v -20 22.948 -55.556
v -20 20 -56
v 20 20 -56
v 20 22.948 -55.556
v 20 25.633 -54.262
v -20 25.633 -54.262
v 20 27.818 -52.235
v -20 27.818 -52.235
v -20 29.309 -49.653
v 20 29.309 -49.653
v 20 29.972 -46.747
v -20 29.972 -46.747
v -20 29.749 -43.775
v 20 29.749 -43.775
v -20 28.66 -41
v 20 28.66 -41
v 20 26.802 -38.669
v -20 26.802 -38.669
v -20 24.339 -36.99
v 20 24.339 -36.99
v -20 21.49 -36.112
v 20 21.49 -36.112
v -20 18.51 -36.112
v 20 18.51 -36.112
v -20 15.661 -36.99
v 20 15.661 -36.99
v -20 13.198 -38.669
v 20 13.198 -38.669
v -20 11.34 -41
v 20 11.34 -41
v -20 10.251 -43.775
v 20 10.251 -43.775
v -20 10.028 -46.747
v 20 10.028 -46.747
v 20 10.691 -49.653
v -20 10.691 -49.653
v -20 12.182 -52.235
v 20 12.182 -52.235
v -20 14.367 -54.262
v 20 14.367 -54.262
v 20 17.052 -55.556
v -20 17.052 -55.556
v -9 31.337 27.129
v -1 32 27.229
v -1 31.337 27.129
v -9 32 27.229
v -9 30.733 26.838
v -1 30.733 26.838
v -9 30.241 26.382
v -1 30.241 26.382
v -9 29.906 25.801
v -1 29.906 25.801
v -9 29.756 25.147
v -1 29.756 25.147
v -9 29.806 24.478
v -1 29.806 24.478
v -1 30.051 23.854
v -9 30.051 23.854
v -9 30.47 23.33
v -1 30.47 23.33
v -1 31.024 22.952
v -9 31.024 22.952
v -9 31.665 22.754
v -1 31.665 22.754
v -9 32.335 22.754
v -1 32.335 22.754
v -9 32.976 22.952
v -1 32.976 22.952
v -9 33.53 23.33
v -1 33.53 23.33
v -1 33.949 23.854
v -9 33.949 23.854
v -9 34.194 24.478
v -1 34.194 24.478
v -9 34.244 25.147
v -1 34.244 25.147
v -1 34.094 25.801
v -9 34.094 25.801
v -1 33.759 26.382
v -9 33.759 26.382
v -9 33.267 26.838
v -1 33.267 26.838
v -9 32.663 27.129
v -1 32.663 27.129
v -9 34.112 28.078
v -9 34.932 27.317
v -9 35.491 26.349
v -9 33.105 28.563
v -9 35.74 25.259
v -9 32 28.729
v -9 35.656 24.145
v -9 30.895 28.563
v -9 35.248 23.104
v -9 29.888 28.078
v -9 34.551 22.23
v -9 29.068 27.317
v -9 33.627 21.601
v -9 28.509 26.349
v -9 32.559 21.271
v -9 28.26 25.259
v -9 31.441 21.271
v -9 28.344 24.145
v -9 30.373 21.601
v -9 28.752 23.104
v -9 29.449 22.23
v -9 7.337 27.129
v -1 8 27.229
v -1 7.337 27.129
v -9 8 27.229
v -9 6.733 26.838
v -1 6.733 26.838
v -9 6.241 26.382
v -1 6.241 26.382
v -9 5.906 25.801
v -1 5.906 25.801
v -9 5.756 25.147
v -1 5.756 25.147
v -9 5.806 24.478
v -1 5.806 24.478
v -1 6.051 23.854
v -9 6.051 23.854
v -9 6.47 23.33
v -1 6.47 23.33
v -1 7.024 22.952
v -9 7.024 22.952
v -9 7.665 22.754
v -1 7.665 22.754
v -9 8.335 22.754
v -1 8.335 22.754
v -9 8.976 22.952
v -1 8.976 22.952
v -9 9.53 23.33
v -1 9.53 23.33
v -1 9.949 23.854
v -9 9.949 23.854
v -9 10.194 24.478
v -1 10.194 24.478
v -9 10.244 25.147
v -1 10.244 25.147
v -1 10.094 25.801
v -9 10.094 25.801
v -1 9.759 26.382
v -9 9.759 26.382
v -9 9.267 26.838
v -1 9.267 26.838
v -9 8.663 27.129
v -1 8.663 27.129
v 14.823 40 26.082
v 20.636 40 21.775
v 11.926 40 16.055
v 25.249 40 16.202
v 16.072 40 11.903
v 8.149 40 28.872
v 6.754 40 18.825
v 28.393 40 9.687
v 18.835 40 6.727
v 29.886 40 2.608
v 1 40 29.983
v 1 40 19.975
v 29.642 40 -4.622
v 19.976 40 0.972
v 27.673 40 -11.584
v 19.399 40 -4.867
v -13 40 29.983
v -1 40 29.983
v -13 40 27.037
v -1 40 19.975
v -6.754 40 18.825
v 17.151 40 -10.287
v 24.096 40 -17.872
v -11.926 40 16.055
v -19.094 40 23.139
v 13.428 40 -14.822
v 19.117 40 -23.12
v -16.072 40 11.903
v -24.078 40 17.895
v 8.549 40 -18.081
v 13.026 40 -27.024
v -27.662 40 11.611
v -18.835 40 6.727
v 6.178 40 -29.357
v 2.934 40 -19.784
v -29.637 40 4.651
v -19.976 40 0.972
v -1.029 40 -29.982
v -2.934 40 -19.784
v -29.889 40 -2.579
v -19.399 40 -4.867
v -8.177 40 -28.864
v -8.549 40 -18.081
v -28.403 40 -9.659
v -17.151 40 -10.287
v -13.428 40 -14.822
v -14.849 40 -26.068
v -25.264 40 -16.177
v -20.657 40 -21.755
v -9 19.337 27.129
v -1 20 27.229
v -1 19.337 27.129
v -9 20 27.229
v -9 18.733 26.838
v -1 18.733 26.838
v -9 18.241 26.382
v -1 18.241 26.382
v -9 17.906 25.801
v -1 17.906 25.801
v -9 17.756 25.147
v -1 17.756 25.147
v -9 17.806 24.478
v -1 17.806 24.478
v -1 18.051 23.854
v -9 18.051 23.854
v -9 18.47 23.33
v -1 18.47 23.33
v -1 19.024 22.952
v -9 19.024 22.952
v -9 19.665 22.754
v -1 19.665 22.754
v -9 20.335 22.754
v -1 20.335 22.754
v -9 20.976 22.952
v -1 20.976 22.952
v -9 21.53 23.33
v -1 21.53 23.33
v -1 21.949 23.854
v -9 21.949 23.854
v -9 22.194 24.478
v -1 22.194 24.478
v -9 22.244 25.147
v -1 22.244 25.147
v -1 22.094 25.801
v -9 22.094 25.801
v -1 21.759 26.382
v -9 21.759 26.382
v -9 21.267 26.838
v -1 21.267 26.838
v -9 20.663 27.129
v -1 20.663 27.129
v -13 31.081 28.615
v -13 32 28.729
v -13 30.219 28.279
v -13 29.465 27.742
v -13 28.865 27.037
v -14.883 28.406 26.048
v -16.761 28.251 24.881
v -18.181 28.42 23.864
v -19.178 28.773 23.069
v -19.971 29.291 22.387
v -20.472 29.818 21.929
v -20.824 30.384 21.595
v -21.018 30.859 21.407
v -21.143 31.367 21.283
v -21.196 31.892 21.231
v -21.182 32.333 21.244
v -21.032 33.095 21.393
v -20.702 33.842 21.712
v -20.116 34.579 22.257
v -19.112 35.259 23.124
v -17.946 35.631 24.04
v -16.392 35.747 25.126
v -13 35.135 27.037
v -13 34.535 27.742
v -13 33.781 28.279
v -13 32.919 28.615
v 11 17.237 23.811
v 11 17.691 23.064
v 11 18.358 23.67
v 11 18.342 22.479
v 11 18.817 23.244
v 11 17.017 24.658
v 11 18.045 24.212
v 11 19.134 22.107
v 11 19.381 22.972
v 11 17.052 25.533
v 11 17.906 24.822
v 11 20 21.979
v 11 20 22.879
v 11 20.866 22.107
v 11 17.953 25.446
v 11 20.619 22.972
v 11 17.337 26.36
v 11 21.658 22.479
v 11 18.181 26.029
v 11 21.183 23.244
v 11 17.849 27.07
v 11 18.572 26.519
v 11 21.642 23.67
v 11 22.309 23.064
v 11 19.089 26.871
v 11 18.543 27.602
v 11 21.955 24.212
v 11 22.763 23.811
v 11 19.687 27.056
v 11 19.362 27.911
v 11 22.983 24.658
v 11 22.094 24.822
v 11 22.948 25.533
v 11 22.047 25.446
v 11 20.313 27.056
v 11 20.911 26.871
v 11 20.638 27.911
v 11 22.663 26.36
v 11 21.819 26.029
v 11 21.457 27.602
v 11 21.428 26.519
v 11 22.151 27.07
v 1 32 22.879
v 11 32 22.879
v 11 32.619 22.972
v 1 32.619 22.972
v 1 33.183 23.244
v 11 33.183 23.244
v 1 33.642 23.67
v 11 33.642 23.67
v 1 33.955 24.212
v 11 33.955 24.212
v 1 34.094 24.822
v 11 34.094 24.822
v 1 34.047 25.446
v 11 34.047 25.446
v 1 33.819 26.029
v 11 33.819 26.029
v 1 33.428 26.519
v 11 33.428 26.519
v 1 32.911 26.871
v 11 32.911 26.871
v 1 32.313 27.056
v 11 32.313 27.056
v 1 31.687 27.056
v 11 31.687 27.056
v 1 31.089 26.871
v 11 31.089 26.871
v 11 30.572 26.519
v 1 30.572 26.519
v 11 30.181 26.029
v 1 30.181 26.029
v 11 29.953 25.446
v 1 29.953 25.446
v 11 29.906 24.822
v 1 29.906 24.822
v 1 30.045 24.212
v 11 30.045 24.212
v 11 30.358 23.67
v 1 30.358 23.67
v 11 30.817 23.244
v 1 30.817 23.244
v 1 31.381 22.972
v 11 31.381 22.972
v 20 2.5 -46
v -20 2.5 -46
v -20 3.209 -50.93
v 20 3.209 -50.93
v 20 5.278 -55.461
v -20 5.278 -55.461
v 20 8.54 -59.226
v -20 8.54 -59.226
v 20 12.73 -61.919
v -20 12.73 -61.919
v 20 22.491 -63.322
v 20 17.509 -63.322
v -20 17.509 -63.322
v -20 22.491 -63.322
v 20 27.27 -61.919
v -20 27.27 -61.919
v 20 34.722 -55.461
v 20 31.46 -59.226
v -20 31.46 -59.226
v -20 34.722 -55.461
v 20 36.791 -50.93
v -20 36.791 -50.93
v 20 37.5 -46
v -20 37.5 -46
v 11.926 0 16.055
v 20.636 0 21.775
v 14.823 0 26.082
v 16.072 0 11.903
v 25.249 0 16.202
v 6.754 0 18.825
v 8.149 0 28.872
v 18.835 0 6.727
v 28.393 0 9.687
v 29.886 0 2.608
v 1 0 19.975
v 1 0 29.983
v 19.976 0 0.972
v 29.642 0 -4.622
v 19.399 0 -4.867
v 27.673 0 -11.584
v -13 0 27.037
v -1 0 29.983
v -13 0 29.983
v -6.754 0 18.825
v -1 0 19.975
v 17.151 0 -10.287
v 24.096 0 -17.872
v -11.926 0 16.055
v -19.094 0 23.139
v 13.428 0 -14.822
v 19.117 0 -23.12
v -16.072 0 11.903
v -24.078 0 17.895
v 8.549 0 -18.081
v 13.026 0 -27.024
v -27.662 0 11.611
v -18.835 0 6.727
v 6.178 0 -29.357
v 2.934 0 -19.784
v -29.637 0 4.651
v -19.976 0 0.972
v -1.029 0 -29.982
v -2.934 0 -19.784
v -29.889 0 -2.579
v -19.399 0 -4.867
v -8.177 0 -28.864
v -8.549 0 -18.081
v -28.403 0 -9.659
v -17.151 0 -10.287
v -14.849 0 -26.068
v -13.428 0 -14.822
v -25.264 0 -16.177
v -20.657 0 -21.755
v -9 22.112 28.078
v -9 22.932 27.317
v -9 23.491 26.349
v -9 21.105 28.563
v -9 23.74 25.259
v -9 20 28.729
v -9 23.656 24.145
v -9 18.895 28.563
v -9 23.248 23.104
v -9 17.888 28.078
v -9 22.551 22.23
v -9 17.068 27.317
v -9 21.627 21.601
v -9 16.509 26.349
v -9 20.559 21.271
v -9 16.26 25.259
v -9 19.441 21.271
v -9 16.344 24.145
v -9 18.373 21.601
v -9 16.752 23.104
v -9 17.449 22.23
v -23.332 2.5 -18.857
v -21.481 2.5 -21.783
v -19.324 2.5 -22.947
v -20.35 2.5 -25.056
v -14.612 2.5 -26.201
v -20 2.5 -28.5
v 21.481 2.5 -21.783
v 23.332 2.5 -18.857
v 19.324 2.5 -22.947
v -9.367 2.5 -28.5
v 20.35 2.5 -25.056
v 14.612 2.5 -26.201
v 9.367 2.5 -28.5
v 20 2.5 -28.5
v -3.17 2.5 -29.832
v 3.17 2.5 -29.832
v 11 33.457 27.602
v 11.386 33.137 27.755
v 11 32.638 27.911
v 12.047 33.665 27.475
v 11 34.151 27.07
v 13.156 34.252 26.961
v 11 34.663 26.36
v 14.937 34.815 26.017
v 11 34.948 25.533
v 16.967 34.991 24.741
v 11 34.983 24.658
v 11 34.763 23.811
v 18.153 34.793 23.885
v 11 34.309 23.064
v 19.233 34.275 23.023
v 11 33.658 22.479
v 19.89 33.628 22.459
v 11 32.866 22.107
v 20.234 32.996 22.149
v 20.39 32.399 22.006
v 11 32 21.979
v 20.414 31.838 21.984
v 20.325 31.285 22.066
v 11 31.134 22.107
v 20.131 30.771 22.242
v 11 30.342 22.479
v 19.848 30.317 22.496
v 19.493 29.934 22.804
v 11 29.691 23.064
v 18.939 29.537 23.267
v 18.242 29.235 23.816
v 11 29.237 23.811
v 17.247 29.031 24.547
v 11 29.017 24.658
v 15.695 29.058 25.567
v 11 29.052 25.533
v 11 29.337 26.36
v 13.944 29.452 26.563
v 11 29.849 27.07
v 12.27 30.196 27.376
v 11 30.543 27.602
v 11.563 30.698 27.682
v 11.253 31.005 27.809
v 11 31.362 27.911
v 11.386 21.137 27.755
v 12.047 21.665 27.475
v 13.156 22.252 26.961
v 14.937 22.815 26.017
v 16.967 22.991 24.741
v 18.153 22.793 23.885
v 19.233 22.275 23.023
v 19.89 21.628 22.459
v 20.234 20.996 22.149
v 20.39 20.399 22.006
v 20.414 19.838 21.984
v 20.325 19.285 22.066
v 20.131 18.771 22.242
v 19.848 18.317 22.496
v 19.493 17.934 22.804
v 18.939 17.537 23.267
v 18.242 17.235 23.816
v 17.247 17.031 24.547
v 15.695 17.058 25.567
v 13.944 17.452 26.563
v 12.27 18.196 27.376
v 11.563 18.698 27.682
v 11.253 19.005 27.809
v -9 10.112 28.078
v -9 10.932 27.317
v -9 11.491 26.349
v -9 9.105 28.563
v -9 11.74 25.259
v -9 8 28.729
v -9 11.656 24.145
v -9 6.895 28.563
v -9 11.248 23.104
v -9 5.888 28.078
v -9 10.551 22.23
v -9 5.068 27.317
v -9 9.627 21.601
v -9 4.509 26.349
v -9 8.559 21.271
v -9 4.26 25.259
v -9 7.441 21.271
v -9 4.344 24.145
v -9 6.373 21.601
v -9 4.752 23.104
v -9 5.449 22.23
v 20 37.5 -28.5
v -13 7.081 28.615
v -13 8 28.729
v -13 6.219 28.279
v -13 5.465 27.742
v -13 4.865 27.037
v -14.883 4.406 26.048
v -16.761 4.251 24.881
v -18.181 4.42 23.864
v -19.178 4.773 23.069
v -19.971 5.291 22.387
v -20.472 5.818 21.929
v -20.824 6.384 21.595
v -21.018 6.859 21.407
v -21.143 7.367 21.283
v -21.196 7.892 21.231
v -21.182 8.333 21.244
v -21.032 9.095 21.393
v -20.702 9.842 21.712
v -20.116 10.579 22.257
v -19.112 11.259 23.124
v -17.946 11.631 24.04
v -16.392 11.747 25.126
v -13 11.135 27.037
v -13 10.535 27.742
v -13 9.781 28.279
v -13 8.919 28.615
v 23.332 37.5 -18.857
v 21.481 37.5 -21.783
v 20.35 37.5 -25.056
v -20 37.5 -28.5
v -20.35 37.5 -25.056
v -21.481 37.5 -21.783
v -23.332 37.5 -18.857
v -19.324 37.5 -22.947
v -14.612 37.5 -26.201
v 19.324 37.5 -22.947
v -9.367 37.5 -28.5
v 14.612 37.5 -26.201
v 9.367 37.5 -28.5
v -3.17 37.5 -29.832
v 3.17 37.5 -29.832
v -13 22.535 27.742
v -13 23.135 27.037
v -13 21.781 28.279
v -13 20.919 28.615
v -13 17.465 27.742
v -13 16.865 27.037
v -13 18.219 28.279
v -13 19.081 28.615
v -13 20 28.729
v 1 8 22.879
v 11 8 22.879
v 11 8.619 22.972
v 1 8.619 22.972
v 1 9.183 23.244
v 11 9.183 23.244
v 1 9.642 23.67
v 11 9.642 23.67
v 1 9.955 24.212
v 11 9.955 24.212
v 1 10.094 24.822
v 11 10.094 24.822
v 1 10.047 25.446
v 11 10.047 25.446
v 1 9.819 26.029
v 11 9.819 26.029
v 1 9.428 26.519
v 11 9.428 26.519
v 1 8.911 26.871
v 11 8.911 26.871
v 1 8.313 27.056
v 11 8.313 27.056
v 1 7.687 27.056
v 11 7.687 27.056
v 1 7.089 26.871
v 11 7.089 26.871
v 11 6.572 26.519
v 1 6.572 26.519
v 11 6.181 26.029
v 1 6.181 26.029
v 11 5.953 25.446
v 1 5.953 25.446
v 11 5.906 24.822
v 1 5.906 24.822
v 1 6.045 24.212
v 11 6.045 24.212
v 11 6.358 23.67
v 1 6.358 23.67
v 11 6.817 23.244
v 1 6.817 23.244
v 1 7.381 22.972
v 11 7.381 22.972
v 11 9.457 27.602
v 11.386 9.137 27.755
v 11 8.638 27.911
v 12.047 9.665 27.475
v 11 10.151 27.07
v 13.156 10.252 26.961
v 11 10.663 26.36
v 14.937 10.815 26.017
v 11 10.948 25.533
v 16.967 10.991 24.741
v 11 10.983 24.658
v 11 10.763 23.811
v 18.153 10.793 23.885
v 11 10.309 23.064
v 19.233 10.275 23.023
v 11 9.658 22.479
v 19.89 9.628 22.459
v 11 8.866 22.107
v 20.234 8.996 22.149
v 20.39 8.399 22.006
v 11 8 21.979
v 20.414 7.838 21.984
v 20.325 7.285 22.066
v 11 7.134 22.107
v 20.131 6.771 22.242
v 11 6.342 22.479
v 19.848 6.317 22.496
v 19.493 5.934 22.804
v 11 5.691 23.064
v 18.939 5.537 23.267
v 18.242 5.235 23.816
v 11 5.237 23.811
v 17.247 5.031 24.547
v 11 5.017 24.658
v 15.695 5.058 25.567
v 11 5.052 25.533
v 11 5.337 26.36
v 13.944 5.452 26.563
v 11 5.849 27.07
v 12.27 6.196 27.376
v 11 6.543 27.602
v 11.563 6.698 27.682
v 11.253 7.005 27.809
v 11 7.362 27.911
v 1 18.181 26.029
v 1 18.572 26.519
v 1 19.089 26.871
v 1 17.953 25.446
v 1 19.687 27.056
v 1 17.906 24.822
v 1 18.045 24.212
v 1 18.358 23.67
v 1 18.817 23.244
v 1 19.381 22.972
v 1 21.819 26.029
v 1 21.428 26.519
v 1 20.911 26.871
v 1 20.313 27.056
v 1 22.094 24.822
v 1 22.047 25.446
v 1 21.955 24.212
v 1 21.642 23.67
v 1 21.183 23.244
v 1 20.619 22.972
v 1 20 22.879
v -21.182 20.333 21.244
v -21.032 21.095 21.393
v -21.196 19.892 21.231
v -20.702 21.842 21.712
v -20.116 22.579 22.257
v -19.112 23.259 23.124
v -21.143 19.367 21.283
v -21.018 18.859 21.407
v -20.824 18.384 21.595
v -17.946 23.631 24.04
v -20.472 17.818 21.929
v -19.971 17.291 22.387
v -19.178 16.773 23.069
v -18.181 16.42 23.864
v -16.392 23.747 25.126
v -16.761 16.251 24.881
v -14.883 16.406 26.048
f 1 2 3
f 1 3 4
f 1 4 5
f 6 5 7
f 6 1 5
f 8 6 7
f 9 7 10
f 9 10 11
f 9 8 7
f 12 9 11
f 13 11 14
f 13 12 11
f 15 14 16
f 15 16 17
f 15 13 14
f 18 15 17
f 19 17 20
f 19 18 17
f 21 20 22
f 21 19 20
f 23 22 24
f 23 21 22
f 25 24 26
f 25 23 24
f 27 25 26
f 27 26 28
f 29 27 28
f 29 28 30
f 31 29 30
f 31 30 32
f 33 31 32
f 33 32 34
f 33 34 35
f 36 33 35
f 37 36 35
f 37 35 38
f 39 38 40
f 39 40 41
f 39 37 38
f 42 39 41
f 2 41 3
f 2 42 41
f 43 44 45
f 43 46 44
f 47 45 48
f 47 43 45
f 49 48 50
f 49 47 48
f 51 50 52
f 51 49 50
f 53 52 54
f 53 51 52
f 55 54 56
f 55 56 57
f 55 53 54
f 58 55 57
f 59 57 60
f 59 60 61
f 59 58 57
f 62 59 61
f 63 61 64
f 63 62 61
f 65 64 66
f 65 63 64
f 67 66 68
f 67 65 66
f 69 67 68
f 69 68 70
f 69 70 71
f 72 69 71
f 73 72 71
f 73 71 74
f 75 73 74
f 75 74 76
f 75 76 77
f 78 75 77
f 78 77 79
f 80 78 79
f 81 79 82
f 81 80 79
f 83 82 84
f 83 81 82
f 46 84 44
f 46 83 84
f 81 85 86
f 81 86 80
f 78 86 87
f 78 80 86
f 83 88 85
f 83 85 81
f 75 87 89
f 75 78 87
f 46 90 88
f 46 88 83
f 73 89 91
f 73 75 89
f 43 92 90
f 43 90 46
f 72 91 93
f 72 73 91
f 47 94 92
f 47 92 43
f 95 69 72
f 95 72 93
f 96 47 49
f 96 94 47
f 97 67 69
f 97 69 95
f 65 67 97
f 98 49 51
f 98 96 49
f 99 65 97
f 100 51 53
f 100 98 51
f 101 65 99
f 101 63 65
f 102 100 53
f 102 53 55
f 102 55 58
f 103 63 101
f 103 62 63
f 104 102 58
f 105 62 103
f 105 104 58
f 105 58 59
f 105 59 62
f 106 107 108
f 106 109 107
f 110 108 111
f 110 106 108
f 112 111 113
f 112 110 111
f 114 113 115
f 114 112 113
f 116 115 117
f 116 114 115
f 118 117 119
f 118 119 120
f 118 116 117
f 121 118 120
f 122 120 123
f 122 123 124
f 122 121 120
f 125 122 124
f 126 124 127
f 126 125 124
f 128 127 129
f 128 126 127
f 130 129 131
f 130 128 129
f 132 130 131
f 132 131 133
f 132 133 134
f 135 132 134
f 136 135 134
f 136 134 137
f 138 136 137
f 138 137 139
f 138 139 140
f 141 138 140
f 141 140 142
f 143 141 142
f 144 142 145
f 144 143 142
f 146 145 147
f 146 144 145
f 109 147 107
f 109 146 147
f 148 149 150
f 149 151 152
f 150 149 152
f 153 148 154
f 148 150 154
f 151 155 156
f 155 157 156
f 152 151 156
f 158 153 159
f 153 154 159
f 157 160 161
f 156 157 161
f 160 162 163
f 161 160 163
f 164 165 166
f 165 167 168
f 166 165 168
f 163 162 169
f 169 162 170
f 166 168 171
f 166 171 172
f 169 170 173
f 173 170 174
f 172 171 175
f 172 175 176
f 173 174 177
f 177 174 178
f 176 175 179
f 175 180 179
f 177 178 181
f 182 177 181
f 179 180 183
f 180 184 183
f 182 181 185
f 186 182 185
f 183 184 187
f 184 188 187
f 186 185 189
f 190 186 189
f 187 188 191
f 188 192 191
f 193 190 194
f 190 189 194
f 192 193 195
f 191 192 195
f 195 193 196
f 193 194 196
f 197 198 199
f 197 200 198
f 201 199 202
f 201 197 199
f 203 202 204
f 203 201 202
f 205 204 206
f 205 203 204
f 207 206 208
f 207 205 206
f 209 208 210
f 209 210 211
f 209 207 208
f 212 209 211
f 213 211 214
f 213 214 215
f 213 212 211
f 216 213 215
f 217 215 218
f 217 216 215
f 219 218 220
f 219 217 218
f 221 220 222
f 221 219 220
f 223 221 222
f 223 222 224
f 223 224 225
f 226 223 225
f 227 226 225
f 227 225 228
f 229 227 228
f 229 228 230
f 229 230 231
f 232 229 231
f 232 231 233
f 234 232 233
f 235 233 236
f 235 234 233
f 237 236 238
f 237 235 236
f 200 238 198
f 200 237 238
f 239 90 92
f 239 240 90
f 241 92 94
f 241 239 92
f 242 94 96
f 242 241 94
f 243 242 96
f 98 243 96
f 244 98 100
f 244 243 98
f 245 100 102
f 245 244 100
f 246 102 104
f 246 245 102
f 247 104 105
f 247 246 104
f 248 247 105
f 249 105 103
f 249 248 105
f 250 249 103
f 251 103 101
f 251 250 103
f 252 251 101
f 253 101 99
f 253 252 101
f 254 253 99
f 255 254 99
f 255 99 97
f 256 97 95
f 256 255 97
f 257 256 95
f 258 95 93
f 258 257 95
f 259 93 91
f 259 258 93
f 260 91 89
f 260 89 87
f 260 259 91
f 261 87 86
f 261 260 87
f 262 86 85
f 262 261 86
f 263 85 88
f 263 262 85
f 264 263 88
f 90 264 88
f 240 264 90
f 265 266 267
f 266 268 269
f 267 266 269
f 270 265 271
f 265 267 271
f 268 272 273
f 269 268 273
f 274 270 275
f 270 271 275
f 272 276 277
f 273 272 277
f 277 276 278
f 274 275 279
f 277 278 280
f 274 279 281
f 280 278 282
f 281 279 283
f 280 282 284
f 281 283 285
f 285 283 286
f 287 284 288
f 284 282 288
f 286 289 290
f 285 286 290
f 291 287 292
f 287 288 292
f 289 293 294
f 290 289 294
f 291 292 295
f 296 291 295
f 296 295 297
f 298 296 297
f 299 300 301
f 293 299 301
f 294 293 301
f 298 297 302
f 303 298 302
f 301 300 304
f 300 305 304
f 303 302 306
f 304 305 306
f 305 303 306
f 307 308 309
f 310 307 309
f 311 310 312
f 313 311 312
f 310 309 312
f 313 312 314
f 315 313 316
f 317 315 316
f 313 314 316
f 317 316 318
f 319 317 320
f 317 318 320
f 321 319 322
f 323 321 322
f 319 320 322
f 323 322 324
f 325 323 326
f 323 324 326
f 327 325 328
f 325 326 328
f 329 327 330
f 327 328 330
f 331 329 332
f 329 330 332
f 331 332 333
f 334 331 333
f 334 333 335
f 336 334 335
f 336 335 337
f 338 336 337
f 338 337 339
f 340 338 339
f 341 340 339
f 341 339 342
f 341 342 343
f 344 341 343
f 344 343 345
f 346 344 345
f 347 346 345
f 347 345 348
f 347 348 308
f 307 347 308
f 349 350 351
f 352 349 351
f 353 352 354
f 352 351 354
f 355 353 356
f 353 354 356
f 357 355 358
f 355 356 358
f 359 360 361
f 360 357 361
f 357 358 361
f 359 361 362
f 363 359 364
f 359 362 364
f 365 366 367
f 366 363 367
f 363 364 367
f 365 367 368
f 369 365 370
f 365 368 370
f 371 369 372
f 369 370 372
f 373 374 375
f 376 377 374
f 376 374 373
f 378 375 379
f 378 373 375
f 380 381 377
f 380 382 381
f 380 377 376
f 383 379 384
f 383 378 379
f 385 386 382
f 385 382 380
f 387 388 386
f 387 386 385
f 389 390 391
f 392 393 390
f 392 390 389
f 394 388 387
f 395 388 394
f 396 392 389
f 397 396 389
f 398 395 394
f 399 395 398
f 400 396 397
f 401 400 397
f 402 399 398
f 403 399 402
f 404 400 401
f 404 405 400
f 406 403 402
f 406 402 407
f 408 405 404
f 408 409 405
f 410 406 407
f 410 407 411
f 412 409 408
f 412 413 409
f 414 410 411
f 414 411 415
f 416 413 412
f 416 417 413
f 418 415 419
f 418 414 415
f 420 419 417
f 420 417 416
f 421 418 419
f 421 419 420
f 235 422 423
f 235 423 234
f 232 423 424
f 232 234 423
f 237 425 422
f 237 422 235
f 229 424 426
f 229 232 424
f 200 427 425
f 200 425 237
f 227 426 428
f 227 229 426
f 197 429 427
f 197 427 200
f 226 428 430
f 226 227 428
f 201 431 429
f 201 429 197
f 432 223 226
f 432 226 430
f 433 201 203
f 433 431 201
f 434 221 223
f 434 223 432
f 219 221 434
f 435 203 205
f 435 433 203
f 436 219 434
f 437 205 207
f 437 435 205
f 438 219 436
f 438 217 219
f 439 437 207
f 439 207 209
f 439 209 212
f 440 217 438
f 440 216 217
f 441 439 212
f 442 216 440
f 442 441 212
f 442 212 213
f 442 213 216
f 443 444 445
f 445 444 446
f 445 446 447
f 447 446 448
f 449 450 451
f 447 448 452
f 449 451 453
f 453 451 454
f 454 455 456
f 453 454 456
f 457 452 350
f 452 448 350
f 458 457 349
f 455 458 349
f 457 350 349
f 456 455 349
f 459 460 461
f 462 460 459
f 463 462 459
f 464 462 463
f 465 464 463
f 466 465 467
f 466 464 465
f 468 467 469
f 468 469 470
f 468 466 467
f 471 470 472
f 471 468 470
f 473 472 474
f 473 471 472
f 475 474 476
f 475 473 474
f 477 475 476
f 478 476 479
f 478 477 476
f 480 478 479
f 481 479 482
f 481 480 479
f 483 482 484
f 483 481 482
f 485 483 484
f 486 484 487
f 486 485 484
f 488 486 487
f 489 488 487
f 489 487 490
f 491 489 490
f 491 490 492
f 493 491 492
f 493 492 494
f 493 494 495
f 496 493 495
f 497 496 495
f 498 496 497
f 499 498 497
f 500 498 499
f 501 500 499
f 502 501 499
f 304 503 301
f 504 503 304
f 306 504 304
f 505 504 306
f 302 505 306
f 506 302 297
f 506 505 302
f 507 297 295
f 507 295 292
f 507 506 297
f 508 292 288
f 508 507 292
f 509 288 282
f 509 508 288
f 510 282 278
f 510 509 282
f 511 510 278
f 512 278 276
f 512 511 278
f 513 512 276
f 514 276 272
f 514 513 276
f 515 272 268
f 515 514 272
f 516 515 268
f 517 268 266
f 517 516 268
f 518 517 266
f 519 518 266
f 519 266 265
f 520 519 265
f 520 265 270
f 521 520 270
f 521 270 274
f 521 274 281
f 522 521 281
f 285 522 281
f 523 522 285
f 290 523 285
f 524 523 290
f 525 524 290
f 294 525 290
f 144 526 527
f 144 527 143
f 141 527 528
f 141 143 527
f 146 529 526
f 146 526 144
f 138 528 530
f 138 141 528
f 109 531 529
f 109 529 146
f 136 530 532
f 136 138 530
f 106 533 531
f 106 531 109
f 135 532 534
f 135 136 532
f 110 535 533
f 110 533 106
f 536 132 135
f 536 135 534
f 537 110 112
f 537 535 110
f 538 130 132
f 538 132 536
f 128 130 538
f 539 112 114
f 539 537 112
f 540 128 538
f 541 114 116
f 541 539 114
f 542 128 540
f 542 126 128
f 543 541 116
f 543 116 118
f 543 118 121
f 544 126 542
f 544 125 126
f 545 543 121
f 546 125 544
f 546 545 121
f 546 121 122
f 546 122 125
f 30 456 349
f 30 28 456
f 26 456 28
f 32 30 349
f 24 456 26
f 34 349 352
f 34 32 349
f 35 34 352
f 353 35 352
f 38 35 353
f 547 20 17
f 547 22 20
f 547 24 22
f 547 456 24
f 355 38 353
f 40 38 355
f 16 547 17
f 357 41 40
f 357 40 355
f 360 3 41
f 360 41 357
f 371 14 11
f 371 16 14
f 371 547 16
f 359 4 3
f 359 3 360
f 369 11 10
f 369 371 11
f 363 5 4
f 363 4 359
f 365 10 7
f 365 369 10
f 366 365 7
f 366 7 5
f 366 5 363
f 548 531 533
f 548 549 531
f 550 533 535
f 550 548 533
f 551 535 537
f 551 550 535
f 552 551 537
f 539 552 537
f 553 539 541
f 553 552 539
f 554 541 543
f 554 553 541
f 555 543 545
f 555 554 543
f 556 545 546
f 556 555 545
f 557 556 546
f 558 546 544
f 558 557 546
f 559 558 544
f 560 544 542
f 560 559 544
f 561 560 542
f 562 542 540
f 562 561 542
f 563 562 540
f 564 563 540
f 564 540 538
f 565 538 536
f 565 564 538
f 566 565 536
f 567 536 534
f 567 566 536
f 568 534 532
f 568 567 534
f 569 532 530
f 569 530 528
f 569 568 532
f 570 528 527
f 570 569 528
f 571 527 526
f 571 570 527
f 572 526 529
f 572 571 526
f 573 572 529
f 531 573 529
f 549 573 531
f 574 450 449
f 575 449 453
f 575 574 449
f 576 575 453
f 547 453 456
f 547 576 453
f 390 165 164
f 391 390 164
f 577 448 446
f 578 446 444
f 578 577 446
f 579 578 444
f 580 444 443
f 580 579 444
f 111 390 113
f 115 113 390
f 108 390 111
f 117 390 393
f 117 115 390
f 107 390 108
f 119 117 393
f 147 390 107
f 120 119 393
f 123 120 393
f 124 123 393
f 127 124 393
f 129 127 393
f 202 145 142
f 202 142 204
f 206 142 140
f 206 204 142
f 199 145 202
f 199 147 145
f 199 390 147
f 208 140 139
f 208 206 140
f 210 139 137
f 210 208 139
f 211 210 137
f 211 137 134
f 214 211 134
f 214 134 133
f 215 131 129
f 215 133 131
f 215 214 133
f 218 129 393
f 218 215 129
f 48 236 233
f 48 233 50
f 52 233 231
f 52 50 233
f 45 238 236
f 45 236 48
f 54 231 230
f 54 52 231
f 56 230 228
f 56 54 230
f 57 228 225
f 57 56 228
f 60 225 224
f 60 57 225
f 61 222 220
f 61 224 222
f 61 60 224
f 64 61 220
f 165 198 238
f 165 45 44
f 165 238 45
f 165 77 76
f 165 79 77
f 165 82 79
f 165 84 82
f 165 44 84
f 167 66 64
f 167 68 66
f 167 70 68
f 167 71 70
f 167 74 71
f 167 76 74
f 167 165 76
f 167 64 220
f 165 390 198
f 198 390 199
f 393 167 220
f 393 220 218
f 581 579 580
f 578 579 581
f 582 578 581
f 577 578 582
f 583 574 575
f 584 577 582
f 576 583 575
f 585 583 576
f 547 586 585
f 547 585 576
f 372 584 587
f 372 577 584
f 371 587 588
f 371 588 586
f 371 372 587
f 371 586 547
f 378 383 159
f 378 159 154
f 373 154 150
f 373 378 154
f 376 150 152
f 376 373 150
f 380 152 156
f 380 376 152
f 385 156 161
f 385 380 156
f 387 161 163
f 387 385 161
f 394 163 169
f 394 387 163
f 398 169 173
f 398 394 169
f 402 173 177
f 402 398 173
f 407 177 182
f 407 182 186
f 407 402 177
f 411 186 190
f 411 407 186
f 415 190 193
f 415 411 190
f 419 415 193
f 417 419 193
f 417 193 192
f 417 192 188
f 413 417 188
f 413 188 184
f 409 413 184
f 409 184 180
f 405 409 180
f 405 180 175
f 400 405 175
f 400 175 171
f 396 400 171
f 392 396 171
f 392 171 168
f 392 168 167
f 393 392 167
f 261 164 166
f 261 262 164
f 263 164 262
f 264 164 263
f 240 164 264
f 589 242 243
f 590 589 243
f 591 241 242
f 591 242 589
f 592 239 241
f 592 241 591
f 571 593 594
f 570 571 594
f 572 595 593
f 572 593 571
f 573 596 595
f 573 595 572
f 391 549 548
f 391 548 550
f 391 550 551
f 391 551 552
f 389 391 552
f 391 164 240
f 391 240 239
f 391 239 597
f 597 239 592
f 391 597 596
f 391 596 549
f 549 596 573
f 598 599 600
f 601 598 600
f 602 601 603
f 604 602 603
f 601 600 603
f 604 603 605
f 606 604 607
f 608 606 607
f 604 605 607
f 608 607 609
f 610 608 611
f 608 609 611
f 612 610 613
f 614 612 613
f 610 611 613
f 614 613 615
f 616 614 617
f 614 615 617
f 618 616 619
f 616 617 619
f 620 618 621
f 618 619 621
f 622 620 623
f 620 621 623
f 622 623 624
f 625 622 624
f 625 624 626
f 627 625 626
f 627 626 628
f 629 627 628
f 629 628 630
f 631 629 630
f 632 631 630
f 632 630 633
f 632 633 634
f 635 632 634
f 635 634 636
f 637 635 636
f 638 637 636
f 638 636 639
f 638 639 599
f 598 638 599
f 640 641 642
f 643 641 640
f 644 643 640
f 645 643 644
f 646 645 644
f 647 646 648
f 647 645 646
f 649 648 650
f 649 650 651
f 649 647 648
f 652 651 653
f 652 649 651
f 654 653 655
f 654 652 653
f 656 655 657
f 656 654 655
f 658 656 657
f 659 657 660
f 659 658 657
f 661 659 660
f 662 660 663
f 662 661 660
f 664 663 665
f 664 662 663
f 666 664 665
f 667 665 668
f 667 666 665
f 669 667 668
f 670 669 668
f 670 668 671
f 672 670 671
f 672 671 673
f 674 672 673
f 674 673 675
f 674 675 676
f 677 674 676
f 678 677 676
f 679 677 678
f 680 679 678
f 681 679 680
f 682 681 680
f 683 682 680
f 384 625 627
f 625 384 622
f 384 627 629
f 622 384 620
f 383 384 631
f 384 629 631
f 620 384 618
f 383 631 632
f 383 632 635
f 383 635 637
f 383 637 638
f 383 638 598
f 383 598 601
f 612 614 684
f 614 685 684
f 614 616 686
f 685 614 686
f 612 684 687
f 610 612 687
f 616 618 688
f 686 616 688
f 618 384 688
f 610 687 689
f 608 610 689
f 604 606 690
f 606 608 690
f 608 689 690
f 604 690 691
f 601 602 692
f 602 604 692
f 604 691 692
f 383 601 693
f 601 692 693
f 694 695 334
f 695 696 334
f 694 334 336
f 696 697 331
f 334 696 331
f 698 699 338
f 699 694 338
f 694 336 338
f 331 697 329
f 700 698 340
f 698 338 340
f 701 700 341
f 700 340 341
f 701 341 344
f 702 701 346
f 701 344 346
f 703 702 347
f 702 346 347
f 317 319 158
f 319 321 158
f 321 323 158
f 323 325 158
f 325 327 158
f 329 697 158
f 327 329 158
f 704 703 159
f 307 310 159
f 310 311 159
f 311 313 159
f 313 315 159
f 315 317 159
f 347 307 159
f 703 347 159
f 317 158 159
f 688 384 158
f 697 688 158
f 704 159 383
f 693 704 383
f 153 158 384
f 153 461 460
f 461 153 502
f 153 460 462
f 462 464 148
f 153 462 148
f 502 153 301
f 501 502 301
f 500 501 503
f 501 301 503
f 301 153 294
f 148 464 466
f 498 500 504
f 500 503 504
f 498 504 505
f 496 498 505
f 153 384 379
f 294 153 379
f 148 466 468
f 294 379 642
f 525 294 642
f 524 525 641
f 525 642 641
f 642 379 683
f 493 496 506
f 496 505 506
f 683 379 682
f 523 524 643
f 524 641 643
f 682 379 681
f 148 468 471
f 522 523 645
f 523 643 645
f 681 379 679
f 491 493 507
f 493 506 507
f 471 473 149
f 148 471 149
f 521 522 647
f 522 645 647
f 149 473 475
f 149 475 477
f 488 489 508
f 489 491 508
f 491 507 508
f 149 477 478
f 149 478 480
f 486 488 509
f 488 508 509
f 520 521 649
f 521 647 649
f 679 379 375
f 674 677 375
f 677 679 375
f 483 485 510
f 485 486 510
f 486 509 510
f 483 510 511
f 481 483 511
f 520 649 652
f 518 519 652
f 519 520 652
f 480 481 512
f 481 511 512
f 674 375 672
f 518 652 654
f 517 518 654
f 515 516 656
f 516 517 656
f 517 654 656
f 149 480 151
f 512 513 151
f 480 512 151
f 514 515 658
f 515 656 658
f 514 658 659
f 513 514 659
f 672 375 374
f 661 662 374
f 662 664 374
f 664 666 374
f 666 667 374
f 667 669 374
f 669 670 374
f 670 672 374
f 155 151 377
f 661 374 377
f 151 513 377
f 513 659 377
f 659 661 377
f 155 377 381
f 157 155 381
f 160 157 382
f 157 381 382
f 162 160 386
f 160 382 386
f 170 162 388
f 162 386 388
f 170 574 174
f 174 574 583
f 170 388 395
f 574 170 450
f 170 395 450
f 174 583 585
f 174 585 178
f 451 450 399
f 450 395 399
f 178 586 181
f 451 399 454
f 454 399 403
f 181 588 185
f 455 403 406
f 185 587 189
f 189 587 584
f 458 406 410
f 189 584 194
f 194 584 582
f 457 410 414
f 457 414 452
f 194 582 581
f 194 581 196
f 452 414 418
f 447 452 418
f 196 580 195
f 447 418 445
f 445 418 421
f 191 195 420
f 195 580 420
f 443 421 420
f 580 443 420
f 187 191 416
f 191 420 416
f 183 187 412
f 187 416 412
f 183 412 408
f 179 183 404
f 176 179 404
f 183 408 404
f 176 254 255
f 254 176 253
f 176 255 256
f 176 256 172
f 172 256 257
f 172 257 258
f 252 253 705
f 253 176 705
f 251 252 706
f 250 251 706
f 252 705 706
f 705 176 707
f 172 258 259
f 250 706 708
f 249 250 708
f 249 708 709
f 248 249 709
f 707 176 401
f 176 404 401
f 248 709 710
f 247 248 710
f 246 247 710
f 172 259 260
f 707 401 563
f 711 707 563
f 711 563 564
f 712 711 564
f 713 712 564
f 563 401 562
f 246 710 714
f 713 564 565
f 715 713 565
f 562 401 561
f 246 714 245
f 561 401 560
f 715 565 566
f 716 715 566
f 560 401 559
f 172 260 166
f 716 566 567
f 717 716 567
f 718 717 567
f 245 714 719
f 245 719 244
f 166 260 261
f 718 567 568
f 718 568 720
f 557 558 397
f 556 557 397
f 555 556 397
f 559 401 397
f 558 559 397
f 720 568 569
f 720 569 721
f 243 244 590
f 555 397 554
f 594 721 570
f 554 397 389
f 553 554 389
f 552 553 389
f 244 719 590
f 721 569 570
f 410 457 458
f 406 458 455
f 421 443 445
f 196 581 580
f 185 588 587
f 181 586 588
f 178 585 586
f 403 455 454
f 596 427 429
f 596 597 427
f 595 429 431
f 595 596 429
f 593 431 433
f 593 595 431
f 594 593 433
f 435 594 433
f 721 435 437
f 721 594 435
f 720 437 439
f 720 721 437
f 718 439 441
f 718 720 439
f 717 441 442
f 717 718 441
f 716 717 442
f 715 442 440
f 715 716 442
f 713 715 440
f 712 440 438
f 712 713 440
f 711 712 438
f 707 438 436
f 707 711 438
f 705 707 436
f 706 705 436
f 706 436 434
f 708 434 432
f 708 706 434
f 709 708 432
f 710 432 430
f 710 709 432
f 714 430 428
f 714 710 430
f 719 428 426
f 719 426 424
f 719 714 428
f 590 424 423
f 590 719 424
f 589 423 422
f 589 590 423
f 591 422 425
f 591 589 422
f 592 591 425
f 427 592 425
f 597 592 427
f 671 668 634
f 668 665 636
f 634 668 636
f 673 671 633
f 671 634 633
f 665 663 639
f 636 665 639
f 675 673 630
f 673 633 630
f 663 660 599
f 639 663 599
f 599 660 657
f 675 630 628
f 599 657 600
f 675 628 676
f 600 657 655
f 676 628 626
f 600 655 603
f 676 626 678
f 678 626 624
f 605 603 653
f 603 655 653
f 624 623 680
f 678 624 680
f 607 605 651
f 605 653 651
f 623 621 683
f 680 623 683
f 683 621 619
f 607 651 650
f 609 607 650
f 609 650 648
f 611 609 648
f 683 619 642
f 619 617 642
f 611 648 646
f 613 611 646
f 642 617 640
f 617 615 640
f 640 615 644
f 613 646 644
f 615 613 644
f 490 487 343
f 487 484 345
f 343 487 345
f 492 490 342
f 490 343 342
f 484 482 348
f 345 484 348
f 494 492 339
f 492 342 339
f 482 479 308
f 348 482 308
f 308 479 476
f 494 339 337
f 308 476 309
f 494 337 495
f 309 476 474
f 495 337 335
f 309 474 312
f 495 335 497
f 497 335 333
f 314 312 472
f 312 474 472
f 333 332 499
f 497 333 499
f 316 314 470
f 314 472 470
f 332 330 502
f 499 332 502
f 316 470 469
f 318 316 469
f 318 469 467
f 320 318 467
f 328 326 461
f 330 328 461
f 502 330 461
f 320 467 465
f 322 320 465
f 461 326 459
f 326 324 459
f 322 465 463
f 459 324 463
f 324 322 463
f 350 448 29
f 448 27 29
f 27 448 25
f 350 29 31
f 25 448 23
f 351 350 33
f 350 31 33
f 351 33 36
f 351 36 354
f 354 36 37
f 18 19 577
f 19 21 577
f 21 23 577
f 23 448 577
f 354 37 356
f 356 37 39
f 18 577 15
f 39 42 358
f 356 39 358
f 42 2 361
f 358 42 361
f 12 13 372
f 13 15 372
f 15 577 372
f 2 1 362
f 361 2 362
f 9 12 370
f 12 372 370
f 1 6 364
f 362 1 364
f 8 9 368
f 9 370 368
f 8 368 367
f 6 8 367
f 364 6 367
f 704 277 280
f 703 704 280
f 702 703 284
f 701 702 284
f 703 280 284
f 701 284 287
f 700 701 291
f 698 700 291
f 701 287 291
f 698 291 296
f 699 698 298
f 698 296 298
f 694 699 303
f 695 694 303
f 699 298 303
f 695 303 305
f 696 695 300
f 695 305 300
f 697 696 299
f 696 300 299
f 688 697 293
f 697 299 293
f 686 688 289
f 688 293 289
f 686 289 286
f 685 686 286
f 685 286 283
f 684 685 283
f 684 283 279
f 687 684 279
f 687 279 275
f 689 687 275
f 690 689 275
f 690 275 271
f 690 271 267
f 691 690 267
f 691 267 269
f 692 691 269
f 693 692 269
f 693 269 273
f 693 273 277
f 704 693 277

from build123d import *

# Parameters (mm, degrees)
SKETCH1_R                                    = 30
SKETCH1_R_2                                  = 20
BOSS_EXTRUDE1_DEPTH                          = 40
SKETCH2_W                                    = 2
SKETCH2_H                                    = 30
CUT_EXTRUDE1_DEPTH                           = 59.309518948
BOSS_EXTRUDE2_START                          = -40
BOSS_EXTRUDE2_DEPTH                          = 40
CBORE_FOR_M4_HEX_SOCKET_HEAD_CAP_SCR_2_COUNT = 2
CBORE_FOR_M4_HEX_SOCKET_HEAD_CAP_SCR_2_PITCH = 12
CBORE_FOR_M4_HEX_SOCKET_HEAD_CAP_SCR_3_COUNT = 2
CBORE_FOR_M4_HEX_SOCKET_HEAD_CAP_SCR_3_PITCH = 24
SKETCH6_R                                    = 3.75
CUT_EXTRUDE2_DEPTH                           = 66.946948375
F_5_4_5_4_DIAMETER_HOLE1_D                   = 4.2
SKETCH10_R                                   = 3
CUT_EXTRUDE3_DEPTH                           = 11
BOSS_EXTRUDE4_DEPTH                          = 20
BOSS_EXTRUDE4_DEPTH_BACK                     = 20
SKETCH13_R                                   = 17.5
SKETCH13_R_2                                 = 10
FILLET1_R                                    = 15


with BuildPart() as part:
    # Sketch1 → Boss-Extrude1 (new body)
    with BuildSketch(Plane(origin=(0, 0, 0), x_dir=(1, 0, 0), z_dir=(0, 1, 0))):
        with Locations(Location((0, 0, 0), (0, 0, 270))):
            Circle(SKETCH1_R)
        with Locations(Location((0, 0, 0), (0, 0, 270))):
            Circle(SKETCH1_R_2, mode=Mode.SUBTRACT)
    extrude(amount=BOSS_EXTRUDE1_DEPTH)

    # Sketch2 → Cut-Extrude1 (cut, through all)
    with BuildSketch(Plane(origin=(0, 40, 0), x_dir=(1, 0, 0), z_dir=(0, 1, 0))):
        with Locations((0, -15)):
            Rectangle(SKETCH2_W, SKETCH2_H)
    extrude(amount=-CUT_EXTRUDE1_DEPTH, mode=Mode.SUBTRACT)

    # Sketch3 → Boss-Extrude2 (add)
    with BuildSketch(Plane(origin=(0, 40, 0), x_dir=(1, 0, 0), z_dir=(0, 1, 0)).offset(BOSS_EXTRUDE2_START)):
        with BuildLine():
            Line((-1, -29.983328701), (-13, -29.983328701))
            Line((-13, -29.983328701), (-13, -27.037011669))
            ThreePointArc((-13, -27.037011669), (-7.153334608, -29.134683866), (-1, -29.983328701))
        make_face()
    extrude(amount=BOSS_EXTRUDE2_DEPTH)

    # Sketch5 → CBORE for M4 Hex Socket Head Cap Screw1 (revolve, cut)
    with BuildSketch(Plane(origin=(-13, 32, 24.979156528), x_dir=(0, 0, 1), z_dir=(0, 1, 0))):
        Polygon((0, 0), (0, 13.351936393), (2.25, 12), (2.25, 4), (3.75, 4), (3.75, 0), align=None)
    cbore_for_m4_hex_socket_head_cap_screw1 = revolve(axis=Axis((-19.35, 32, 24.979156528), (1, 0, 0)), mode=Mode.SUBTRACT)

    # CBORE for M4 Hex Socket Head Cap Scr 2: CBORE for M4 Hex Socket Head Cap Screw1 ×2
    with Locations(*[(0, -i * CBORE_FOR_M4_HEX_SOCKET_HEAD_CAP_SCR_2_PITCH, 0) for i in range(1, CBORE_FOR_M4_HEX_SOCKET_HEAD_CAP_SCR_2_COUNT)]):
        add(cbore_for_m4_hex_socket_head_cap_screw1, mode=Mode.SUBTRACT)

    # CBORE for M4 Hex Socket Head Cap Scr 3: CBORE for M4 Hex Socket Head Cap Screw1 ×2
    with Locations(*[(0, -i * CBORE_FOR_M4_HEX_SOCKET_HEAD_CAP_SCR_3_PITCH, 0) for i in range(1, CBORE_FOR_M4_HEX_SOCKET_HEAD_CAP_SCR_3_COUNT)]):
        add(cbore_for_m4_hex_socket_head_cap_screw1, mode=Mode.SUBTRACT)

    # Sketch6 → Cut-Extrude2 (cut, through all)
    with BuildSketch(Plane.ZY.offset(13)):
        with Locations((24.979156528, 32)):
            Circle(SKETCH6_R)
        with Locations((24.979156528, 20)):
            Circle(SKETCH6_R)
        with Locations((24.979156528, 8)):
            Circle(SKETCH6_R)
    extrude(amount=CUT_EXTRUDE2_DEPTH, mode=Mode.SUBTRACT)

    # Ø5.4 (5.4) Diameter Hole1 (through all)
    with Locations(Plane.ZY.offset(-1)):
        with Locations((24.979156528, 8), (24.979156528, 20), (24.979156528, 32)):
            Hole(F_5_4_5_4_DIAMETER_HOLE1_D / 2)

    # Sketch10 → Cut-Extrude3 (cut)
    with BuildSketch(Plane.ZY.offset(-22)):
        with Locations((24.979156528, 8)):
            Circle(SKETCH10_R)
        with Locations((24.979156528, 32)):
            Circle(SKETCH10_R)
        with Locations((24.979156528, 20)):
            Circle(SKETCH10_R)
    extrude(amount=CUT_EXTRUDE3_DEPTH, mode=Mode.SUBTRACT)

    # Sketch13 → Boss-Extrude4 (add, two sides: drawn at the far end of the back side and taken through both)
    # profile 1 of 3: a face of its own
    with BuildSketch(Plane(origin=(0, 0, 0), x_dir=(0, 0, -1), z_dir=(1, 0, 0)).offset(-BOSS_EXTRUDE4_DEPTH_BACK)):
        with BuildLine():
            ThreePointArc((28.5, 20), (33.625631329, 32.374368671), (46, 37.5))
            Line((46, 37.5), (30, 37.5))
            Line((30, 37.5), (28.5, 37.5))
            Line((28.5, 37.5), (28.5, 20))
        make_face()
    # profile 2 of 3: a face of its own
    with BuildSketch(Plane(origin=(0, 0, 0), x_dir=(0, 0, -1), z_dir=(1, 0, 0)).offset(-BOSS_EXTRUDE4_DEPTH_BACK)):
        with BuildLine():
            ThreePointArc((46, 2.5), (33.625631329, 7.625631329), (28.5, 20))
            Line((28.5, 20), (28.5, 2.5))
            Line((28.5, 2.5), (30, 2.5))
            Line((30, 2.5), (46, 2.5))
        make_face()
    # profile 3 of 3: a face of its own
    with BuildSketch(Plane(origin=(0, 0, 0), x_dir=(0, 0, -1), z_dir=(1, 0, 0)).offset(-BOSS_EXTRUDE4_DEPTH_BACK)):
        with Locations((46, 20)):
            Circle(SKETCH13_R)
        with Locations((46, 20)):
            Circle(SKETCH13_R_2, mode=Mode.SUBTRACT)
    extrude(amount=BOSS_EXTRUDE4_DEPTH + BOSS_EXTRUDE4_DEPTH_BACK)

    # Fillet1
    # the kernel refuses this fillet: 15 mm, written as the material it adds along each edge
    with BuildSketch(Plane(origin=(9.367496998, 37.5, -28.5), x_dir=(0.8228917781054501, 0, 0.5681981357998729), z_dir=(0, -1, 0))) as fillet1_piece_1:
        with BuildLine():
            CenterArc((21.213026524, -14.387505004), FILLET1_R, 106.429799285, 39.762375137)
            Line((8.749399301, -6.041368385), (0, 0))
            ThreePointArc((0, 0), (8.48521061, -1.224989993), (16.970421219, 0))
        make_face()
    extrude(amount=35)
    with BuildSketch(Plane(origin=(-9.367496998, 37.5, -28.5), x_dir=(-0.8228917781054502, 0, 0.5681981357998726), z_dir=(0, -1, 0))) as fillet1_piece_2:
        with BuildLine():
            CenterArc((21.213026524, 14.387505004), FILLET1_R, 213.807825578, 39.762375137)
            Line((8.749399301, 6.041368385), (0, 0))
            ThreePointArc((0, 0), (8.48521061, 1.224989993), (16.970421219, 0))
        make_face()
    extrude(amount=35)


solid = part.part
